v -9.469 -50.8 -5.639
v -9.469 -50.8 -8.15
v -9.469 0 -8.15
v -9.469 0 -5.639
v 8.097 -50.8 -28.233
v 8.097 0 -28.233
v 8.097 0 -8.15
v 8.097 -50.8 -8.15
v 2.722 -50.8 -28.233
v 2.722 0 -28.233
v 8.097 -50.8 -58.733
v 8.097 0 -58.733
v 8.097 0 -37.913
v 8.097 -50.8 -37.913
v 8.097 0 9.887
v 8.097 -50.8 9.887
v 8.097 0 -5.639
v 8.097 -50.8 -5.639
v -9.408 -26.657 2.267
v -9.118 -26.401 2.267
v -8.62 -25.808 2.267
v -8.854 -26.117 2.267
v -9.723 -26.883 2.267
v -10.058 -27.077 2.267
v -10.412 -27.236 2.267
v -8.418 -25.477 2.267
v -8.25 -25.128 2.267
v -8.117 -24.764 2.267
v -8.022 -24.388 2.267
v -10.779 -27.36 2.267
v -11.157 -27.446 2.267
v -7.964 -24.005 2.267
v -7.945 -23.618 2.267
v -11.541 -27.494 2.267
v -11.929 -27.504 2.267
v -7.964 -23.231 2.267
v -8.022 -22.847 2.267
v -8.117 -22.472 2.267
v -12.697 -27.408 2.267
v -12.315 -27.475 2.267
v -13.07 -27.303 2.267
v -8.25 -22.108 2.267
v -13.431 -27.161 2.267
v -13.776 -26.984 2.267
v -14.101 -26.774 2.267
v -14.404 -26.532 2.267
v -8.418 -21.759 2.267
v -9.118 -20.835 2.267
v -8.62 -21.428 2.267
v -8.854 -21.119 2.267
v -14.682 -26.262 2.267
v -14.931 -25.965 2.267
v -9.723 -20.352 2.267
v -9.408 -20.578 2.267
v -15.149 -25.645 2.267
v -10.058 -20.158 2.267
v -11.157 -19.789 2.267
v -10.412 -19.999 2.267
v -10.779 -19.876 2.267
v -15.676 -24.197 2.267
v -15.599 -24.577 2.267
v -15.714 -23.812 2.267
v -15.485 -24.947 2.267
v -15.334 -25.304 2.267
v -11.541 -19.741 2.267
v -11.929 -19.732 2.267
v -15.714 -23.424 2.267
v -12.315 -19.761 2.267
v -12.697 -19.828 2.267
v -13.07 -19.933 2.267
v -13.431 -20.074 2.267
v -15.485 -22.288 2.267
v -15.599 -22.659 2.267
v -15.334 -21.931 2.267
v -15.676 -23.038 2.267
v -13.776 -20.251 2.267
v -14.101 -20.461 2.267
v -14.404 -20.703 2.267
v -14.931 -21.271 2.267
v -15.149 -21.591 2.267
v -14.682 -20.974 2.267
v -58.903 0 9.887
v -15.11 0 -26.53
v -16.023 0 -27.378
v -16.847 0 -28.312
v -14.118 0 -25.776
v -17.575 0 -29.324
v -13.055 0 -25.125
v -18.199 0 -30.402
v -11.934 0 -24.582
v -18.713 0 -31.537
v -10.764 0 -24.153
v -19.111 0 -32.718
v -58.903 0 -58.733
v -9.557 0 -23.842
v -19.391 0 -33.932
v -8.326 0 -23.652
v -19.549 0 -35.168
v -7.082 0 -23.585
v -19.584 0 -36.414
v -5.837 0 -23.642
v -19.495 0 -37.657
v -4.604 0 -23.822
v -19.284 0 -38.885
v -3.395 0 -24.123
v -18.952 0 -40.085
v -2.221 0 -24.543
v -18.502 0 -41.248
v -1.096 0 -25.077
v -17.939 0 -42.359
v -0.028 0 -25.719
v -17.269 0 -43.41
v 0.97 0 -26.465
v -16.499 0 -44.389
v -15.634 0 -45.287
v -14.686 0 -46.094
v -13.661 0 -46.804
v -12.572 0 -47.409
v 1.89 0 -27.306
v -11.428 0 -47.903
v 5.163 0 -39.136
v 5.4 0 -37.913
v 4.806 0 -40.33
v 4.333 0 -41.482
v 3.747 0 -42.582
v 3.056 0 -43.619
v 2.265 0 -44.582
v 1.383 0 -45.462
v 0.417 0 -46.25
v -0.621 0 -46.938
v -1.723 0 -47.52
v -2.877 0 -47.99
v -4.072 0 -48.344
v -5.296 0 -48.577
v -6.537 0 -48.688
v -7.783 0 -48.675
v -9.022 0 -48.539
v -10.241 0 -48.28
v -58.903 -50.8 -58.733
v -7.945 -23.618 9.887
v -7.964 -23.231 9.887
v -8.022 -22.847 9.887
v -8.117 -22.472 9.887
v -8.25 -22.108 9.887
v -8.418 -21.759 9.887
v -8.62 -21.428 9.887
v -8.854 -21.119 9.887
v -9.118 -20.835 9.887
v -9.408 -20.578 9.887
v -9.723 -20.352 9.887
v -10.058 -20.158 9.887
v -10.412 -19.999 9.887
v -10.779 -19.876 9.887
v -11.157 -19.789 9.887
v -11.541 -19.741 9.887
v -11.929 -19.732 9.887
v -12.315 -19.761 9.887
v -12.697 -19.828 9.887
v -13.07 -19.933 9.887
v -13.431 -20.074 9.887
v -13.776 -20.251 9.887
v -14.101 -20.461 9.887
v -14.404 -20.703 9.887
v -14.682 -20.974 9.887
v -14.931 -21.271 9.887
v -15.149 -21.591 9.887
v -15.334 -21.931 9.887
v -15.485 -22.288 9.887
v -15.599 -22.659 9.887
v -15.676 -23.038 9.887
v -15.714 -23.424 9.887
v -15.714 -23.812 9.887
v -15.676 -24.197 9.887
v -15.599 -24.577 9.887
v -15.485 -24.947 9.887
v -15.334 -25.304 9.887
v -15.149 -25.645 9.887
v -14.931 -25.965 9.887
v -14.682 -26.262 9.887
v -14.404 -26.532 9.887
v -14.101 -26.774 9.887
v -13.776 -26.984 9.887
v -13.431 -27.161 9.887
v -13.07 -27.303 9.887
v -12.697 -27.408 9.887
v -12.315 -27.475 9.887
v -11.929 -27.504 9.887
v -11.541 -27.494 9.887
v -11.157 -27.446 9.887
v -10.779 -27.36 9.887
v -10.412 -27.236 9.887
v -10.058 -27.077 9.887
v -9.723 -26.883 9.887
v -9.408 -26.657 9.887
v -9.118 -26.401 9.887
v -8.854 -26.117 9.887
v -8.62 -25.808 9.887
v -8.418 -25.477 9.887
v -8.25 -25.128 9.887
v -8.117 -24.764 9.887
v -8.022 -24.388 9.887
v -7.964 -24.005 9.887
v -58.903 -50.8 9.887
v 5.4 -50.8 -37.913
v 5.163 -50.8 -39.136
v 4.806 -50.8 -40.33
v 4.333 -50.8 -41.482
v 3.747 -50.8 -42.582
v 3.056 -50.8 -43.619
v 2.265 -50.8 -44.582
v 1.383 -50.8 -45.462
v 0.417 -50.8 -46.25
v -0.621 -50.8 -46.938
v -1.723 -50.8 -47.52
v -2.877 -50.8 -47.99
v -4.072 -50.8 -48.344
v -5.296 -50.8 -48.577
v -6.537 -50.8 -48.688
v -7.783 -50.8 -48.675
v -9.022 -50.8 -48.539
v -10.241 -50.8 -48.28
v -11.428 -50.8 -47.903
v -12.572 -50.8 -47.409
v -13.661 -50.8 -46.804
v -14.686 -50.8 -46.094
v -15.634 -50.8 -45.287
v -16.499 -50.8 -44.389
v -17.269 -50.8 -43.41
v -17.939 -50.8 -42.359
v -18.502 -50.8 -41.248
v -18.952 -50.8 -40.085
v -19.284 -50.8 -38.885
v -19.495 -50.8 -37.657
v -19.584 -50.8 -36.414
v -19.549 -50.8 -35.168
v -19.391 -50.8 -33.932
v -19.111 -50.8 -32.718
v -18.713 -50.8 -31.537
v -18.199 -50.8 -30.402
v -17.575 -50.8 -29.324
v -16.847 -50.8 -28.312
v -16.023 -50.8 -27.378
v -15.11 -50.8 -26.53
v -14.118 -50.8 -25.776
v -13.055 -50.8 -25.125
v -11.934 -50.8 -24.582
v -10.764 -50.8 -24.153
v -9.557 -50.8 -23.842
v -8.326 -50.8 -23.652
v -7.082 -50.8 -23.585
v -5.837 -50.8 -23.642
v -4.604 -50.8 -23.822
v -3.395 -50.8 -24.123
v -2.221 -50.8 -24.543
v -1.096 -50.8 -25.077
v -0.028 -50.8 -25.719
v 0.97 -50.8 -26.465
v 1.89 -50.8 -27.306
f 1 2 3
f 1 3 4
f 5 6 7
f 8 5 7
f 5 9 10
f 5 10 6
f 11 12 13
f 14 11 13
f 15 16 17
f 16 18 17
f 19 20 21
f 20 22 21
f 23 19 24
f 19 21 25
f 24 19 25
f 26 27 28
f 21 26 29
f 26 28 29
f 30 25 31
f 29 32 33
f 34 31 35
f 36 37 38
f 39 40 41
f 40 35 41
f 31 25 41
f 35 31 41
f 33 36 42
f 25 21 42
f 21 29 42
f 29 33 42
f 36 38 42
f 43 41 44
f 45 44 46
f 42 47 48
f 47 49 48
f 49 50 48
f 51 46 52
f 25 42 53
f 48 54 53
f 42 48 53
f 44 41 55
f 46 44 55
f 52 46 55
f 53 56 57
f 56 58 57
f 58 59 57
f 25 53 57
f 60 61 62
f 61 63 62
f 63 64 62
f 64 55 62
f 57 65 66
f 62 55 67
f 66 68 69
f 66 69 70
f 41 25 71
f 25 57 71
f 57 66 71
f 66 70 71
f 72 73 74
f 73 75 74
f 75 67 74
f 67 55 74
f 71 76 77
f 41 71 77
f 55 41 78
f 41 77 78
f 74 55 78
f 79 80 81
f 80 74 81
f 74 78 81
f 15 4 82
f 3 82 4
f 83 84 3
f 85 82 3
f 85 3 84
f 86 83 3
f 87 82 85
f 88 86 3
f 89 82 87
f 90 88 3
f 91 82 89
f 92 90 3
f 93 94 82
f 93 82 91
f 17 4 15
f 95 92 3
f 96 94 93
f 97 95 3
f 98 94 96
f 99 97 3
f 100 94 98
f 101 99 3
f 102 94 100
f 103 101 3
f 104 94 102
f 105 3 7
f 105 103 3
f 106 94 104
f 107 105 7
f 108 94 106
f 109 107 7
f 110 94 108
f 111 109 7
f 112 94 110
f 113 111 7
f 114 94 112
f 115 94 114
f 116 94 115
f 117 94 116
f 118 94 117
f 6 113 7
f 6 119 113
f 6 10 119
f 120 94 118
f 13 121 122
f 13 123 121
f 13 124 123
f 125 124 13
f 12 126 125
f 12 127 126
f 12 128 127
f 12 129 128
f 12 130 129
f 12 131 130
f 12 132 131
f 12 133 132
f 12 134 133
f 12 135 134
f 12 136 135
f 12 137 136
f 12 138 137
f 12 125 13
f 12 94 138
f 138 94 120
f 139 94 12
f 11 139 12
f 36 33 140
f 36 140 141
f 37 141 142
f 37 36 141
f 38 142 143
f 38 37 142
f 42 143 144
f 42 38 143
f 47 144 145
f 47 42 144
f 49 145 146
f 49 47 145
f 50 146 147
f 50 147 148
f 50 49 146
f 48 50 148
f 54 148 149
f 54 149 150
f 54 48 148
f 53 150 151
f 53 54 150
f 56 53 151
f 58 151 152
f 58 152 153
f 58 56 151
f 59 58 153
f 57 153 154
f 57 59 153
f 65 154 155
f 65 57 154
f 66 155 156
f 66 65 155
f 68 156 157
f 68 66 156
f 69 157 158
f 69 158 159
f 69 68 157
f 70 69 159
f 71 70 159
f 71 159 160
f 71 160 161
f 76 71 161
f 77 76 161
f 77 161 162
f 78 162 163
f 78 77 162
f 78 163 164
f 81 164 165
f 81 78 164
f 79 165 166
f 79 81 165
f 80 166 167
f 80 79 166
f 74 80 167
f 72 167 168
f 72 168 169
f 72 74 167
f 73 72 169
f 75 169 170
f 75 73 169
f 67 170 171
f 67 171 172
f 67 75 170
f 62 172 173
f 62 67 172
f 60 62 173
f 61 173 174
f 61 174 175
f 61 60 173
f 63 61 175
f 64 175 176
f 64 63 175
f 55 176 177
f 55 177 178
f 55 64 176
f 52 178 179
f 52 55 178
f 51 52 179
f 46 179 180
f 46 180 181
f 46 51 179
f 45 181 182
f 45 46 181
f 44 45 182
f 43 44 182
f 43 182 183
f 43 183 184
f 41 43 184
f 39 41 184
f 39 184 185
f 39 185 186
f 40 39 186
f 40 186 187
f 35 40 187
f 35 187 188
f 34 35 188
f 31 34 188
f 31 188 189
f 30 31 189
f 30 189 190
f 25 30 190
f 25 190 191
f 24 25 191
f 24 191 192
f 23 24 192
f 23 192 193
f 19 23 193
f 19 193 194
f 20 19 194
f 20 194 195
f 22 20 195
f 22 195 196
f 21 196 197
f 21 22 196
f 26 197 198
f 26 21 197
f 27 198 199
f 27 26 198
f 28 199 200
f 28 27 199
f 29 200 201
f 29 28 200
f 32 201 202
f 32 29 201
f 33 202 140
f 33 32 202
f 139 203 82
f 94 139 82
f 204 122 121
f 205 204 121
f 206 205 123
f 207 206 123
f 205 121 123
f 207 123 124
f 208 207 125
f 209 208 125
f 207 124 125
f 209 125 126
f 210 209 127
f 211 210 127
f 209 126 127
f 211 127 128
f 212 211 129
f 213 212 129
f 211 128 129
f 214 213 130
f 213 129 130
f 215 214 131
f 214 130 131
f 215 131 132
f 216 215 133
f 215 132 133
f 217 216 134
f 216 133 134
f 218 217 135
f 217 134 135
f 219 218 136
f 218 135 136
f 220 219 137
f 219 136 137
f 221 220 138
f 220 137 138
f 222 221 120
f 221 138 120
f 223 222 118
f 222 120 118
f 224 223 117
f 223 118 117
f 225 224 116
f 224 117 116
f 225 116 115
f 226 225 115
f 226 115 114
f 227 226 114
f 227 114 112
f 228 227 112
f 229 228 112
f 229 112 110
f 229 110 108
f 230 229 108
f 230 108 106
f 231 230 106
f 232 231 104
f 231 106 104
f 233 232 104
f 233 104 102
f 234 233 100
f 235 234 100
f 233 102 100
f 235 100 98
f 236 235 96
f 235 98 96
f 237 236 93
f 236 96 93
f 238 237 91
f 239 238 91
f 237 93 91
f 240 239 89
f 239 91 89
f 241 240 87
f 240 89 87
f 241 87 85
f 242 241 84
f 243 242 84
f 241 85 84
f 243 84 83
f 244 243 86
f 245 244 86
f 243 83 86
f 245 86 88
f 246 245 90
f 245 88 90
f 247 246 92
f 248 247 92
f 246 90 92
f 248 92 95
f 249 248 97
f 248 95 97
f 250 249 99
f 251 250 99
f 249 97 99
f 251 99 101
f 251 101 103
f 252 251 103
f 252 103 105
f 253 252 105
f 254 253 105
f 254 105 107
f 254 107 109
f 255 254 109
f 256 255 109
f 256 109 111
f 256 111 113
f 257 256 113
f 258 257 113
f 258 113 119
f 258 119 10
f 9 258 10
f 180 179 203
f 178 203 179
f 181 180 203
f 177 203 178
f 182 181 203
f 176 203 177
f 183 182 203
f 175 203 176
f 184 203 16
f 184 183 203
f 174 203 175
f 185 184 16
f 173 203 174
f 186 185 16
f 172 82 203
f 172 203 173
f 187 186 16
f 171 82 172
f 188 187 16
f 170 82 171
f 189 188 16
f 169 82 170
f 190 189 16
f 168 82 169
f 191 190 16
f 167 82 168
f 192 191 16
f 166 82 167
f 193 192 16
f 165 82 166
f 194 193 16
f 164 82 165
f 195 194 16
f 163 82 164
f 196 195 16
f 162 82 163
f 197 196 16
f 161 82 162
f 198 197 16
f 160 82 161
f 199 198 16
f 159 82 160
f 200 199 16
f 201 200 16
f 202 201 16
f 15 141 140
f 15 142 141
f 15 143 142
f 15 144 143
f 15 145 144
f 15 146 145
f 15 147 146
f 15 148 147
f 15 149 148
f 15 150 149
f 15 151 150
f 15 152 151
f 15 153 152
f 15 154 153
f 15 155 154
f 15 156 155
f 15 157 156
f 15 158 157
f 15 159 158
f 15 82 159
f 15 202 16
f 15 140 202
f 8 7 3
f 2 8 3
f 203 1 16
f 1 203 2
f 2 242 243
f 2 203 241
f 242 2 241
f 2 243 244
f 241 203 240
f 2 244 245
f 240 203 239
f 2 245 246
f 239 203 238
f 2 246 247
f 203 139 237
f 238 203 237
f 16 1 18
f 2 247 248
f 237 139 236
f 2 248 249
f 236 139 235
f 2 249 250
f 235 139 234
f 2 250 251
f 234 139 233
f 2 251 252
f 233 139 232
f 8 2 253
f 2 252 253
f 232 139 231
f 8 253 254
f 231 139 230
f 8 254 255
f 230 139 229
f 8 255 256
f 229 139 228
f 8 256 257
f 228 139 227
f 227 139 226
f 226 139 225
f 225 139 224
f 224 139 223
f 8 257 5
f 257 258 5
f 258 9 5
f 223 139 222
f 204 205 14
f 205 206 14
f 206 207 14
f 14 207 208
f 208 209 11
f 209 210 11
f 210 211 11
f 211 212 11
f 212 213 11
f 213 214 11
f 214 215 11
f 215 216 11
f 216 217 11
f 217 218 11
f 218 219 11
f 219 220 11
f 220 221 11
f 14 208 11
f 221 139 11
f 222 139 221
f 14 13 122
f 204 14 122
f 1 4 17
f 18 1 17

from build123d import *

# Parameters (mm, degrees)
F1_DEPTH = 50.8
F2_W     = 67
F2_H     = 50.8
F2_R     = 3.887383
F3_DEPTH = 7.62


with BuildPart() as f1:
    # F0 (on Front) → F1 (new body)
    with BuildSketch(Plane.XZ):
        with BuildLine():
            Line((8.097237, 2.266741), (-58.902763, 2.266741))
            Line((-58.902763, 2.266741), (-58.902763, -58.733259))
            Line((-58.902763, -58.733259), (8.097237, -58.733259))
            Line((8.097237, -58.733259), (8.097237, -37.91259))
            Line((8.097237, -37.91259), (5.399642, -37.91259))
            ThreePointArc((5.399642, -37.91259), (-19.132664, -39.489125), (2.721969, -28.233259))
            Line((2.721969, -28.233259), (8.097237, -28.233259))
            Line((8.097237, -28.233259), (8.097237, -8.149563))
            Line((8.097237, -8.149563), (-9.469079, -8.149563))
            Line((-9.469079, -8.149563), (-9.469079, -5.638948))
            Line((-9.469079, -5.638948), (8.097237, -5.638948))
            Line((8.097237, -5.638948), (8.097237, 2.266741))
        make_face()
    extrude(amount=F1_DEPTH)

    # F2 (on face) → F3 (join)
    with BuildSketch(Plane.XY.offset(2.266741)):
        with Locations((-25.402763, -25.4)):
            Rectangle(F2_W, F2_H)
        with Locations((-11.831898, -23.617744)):
            Circle(F2_R, mode=Mode.SUBTRACT)
    extrude(amount=F3_DEPTH)


solid = f1.part
